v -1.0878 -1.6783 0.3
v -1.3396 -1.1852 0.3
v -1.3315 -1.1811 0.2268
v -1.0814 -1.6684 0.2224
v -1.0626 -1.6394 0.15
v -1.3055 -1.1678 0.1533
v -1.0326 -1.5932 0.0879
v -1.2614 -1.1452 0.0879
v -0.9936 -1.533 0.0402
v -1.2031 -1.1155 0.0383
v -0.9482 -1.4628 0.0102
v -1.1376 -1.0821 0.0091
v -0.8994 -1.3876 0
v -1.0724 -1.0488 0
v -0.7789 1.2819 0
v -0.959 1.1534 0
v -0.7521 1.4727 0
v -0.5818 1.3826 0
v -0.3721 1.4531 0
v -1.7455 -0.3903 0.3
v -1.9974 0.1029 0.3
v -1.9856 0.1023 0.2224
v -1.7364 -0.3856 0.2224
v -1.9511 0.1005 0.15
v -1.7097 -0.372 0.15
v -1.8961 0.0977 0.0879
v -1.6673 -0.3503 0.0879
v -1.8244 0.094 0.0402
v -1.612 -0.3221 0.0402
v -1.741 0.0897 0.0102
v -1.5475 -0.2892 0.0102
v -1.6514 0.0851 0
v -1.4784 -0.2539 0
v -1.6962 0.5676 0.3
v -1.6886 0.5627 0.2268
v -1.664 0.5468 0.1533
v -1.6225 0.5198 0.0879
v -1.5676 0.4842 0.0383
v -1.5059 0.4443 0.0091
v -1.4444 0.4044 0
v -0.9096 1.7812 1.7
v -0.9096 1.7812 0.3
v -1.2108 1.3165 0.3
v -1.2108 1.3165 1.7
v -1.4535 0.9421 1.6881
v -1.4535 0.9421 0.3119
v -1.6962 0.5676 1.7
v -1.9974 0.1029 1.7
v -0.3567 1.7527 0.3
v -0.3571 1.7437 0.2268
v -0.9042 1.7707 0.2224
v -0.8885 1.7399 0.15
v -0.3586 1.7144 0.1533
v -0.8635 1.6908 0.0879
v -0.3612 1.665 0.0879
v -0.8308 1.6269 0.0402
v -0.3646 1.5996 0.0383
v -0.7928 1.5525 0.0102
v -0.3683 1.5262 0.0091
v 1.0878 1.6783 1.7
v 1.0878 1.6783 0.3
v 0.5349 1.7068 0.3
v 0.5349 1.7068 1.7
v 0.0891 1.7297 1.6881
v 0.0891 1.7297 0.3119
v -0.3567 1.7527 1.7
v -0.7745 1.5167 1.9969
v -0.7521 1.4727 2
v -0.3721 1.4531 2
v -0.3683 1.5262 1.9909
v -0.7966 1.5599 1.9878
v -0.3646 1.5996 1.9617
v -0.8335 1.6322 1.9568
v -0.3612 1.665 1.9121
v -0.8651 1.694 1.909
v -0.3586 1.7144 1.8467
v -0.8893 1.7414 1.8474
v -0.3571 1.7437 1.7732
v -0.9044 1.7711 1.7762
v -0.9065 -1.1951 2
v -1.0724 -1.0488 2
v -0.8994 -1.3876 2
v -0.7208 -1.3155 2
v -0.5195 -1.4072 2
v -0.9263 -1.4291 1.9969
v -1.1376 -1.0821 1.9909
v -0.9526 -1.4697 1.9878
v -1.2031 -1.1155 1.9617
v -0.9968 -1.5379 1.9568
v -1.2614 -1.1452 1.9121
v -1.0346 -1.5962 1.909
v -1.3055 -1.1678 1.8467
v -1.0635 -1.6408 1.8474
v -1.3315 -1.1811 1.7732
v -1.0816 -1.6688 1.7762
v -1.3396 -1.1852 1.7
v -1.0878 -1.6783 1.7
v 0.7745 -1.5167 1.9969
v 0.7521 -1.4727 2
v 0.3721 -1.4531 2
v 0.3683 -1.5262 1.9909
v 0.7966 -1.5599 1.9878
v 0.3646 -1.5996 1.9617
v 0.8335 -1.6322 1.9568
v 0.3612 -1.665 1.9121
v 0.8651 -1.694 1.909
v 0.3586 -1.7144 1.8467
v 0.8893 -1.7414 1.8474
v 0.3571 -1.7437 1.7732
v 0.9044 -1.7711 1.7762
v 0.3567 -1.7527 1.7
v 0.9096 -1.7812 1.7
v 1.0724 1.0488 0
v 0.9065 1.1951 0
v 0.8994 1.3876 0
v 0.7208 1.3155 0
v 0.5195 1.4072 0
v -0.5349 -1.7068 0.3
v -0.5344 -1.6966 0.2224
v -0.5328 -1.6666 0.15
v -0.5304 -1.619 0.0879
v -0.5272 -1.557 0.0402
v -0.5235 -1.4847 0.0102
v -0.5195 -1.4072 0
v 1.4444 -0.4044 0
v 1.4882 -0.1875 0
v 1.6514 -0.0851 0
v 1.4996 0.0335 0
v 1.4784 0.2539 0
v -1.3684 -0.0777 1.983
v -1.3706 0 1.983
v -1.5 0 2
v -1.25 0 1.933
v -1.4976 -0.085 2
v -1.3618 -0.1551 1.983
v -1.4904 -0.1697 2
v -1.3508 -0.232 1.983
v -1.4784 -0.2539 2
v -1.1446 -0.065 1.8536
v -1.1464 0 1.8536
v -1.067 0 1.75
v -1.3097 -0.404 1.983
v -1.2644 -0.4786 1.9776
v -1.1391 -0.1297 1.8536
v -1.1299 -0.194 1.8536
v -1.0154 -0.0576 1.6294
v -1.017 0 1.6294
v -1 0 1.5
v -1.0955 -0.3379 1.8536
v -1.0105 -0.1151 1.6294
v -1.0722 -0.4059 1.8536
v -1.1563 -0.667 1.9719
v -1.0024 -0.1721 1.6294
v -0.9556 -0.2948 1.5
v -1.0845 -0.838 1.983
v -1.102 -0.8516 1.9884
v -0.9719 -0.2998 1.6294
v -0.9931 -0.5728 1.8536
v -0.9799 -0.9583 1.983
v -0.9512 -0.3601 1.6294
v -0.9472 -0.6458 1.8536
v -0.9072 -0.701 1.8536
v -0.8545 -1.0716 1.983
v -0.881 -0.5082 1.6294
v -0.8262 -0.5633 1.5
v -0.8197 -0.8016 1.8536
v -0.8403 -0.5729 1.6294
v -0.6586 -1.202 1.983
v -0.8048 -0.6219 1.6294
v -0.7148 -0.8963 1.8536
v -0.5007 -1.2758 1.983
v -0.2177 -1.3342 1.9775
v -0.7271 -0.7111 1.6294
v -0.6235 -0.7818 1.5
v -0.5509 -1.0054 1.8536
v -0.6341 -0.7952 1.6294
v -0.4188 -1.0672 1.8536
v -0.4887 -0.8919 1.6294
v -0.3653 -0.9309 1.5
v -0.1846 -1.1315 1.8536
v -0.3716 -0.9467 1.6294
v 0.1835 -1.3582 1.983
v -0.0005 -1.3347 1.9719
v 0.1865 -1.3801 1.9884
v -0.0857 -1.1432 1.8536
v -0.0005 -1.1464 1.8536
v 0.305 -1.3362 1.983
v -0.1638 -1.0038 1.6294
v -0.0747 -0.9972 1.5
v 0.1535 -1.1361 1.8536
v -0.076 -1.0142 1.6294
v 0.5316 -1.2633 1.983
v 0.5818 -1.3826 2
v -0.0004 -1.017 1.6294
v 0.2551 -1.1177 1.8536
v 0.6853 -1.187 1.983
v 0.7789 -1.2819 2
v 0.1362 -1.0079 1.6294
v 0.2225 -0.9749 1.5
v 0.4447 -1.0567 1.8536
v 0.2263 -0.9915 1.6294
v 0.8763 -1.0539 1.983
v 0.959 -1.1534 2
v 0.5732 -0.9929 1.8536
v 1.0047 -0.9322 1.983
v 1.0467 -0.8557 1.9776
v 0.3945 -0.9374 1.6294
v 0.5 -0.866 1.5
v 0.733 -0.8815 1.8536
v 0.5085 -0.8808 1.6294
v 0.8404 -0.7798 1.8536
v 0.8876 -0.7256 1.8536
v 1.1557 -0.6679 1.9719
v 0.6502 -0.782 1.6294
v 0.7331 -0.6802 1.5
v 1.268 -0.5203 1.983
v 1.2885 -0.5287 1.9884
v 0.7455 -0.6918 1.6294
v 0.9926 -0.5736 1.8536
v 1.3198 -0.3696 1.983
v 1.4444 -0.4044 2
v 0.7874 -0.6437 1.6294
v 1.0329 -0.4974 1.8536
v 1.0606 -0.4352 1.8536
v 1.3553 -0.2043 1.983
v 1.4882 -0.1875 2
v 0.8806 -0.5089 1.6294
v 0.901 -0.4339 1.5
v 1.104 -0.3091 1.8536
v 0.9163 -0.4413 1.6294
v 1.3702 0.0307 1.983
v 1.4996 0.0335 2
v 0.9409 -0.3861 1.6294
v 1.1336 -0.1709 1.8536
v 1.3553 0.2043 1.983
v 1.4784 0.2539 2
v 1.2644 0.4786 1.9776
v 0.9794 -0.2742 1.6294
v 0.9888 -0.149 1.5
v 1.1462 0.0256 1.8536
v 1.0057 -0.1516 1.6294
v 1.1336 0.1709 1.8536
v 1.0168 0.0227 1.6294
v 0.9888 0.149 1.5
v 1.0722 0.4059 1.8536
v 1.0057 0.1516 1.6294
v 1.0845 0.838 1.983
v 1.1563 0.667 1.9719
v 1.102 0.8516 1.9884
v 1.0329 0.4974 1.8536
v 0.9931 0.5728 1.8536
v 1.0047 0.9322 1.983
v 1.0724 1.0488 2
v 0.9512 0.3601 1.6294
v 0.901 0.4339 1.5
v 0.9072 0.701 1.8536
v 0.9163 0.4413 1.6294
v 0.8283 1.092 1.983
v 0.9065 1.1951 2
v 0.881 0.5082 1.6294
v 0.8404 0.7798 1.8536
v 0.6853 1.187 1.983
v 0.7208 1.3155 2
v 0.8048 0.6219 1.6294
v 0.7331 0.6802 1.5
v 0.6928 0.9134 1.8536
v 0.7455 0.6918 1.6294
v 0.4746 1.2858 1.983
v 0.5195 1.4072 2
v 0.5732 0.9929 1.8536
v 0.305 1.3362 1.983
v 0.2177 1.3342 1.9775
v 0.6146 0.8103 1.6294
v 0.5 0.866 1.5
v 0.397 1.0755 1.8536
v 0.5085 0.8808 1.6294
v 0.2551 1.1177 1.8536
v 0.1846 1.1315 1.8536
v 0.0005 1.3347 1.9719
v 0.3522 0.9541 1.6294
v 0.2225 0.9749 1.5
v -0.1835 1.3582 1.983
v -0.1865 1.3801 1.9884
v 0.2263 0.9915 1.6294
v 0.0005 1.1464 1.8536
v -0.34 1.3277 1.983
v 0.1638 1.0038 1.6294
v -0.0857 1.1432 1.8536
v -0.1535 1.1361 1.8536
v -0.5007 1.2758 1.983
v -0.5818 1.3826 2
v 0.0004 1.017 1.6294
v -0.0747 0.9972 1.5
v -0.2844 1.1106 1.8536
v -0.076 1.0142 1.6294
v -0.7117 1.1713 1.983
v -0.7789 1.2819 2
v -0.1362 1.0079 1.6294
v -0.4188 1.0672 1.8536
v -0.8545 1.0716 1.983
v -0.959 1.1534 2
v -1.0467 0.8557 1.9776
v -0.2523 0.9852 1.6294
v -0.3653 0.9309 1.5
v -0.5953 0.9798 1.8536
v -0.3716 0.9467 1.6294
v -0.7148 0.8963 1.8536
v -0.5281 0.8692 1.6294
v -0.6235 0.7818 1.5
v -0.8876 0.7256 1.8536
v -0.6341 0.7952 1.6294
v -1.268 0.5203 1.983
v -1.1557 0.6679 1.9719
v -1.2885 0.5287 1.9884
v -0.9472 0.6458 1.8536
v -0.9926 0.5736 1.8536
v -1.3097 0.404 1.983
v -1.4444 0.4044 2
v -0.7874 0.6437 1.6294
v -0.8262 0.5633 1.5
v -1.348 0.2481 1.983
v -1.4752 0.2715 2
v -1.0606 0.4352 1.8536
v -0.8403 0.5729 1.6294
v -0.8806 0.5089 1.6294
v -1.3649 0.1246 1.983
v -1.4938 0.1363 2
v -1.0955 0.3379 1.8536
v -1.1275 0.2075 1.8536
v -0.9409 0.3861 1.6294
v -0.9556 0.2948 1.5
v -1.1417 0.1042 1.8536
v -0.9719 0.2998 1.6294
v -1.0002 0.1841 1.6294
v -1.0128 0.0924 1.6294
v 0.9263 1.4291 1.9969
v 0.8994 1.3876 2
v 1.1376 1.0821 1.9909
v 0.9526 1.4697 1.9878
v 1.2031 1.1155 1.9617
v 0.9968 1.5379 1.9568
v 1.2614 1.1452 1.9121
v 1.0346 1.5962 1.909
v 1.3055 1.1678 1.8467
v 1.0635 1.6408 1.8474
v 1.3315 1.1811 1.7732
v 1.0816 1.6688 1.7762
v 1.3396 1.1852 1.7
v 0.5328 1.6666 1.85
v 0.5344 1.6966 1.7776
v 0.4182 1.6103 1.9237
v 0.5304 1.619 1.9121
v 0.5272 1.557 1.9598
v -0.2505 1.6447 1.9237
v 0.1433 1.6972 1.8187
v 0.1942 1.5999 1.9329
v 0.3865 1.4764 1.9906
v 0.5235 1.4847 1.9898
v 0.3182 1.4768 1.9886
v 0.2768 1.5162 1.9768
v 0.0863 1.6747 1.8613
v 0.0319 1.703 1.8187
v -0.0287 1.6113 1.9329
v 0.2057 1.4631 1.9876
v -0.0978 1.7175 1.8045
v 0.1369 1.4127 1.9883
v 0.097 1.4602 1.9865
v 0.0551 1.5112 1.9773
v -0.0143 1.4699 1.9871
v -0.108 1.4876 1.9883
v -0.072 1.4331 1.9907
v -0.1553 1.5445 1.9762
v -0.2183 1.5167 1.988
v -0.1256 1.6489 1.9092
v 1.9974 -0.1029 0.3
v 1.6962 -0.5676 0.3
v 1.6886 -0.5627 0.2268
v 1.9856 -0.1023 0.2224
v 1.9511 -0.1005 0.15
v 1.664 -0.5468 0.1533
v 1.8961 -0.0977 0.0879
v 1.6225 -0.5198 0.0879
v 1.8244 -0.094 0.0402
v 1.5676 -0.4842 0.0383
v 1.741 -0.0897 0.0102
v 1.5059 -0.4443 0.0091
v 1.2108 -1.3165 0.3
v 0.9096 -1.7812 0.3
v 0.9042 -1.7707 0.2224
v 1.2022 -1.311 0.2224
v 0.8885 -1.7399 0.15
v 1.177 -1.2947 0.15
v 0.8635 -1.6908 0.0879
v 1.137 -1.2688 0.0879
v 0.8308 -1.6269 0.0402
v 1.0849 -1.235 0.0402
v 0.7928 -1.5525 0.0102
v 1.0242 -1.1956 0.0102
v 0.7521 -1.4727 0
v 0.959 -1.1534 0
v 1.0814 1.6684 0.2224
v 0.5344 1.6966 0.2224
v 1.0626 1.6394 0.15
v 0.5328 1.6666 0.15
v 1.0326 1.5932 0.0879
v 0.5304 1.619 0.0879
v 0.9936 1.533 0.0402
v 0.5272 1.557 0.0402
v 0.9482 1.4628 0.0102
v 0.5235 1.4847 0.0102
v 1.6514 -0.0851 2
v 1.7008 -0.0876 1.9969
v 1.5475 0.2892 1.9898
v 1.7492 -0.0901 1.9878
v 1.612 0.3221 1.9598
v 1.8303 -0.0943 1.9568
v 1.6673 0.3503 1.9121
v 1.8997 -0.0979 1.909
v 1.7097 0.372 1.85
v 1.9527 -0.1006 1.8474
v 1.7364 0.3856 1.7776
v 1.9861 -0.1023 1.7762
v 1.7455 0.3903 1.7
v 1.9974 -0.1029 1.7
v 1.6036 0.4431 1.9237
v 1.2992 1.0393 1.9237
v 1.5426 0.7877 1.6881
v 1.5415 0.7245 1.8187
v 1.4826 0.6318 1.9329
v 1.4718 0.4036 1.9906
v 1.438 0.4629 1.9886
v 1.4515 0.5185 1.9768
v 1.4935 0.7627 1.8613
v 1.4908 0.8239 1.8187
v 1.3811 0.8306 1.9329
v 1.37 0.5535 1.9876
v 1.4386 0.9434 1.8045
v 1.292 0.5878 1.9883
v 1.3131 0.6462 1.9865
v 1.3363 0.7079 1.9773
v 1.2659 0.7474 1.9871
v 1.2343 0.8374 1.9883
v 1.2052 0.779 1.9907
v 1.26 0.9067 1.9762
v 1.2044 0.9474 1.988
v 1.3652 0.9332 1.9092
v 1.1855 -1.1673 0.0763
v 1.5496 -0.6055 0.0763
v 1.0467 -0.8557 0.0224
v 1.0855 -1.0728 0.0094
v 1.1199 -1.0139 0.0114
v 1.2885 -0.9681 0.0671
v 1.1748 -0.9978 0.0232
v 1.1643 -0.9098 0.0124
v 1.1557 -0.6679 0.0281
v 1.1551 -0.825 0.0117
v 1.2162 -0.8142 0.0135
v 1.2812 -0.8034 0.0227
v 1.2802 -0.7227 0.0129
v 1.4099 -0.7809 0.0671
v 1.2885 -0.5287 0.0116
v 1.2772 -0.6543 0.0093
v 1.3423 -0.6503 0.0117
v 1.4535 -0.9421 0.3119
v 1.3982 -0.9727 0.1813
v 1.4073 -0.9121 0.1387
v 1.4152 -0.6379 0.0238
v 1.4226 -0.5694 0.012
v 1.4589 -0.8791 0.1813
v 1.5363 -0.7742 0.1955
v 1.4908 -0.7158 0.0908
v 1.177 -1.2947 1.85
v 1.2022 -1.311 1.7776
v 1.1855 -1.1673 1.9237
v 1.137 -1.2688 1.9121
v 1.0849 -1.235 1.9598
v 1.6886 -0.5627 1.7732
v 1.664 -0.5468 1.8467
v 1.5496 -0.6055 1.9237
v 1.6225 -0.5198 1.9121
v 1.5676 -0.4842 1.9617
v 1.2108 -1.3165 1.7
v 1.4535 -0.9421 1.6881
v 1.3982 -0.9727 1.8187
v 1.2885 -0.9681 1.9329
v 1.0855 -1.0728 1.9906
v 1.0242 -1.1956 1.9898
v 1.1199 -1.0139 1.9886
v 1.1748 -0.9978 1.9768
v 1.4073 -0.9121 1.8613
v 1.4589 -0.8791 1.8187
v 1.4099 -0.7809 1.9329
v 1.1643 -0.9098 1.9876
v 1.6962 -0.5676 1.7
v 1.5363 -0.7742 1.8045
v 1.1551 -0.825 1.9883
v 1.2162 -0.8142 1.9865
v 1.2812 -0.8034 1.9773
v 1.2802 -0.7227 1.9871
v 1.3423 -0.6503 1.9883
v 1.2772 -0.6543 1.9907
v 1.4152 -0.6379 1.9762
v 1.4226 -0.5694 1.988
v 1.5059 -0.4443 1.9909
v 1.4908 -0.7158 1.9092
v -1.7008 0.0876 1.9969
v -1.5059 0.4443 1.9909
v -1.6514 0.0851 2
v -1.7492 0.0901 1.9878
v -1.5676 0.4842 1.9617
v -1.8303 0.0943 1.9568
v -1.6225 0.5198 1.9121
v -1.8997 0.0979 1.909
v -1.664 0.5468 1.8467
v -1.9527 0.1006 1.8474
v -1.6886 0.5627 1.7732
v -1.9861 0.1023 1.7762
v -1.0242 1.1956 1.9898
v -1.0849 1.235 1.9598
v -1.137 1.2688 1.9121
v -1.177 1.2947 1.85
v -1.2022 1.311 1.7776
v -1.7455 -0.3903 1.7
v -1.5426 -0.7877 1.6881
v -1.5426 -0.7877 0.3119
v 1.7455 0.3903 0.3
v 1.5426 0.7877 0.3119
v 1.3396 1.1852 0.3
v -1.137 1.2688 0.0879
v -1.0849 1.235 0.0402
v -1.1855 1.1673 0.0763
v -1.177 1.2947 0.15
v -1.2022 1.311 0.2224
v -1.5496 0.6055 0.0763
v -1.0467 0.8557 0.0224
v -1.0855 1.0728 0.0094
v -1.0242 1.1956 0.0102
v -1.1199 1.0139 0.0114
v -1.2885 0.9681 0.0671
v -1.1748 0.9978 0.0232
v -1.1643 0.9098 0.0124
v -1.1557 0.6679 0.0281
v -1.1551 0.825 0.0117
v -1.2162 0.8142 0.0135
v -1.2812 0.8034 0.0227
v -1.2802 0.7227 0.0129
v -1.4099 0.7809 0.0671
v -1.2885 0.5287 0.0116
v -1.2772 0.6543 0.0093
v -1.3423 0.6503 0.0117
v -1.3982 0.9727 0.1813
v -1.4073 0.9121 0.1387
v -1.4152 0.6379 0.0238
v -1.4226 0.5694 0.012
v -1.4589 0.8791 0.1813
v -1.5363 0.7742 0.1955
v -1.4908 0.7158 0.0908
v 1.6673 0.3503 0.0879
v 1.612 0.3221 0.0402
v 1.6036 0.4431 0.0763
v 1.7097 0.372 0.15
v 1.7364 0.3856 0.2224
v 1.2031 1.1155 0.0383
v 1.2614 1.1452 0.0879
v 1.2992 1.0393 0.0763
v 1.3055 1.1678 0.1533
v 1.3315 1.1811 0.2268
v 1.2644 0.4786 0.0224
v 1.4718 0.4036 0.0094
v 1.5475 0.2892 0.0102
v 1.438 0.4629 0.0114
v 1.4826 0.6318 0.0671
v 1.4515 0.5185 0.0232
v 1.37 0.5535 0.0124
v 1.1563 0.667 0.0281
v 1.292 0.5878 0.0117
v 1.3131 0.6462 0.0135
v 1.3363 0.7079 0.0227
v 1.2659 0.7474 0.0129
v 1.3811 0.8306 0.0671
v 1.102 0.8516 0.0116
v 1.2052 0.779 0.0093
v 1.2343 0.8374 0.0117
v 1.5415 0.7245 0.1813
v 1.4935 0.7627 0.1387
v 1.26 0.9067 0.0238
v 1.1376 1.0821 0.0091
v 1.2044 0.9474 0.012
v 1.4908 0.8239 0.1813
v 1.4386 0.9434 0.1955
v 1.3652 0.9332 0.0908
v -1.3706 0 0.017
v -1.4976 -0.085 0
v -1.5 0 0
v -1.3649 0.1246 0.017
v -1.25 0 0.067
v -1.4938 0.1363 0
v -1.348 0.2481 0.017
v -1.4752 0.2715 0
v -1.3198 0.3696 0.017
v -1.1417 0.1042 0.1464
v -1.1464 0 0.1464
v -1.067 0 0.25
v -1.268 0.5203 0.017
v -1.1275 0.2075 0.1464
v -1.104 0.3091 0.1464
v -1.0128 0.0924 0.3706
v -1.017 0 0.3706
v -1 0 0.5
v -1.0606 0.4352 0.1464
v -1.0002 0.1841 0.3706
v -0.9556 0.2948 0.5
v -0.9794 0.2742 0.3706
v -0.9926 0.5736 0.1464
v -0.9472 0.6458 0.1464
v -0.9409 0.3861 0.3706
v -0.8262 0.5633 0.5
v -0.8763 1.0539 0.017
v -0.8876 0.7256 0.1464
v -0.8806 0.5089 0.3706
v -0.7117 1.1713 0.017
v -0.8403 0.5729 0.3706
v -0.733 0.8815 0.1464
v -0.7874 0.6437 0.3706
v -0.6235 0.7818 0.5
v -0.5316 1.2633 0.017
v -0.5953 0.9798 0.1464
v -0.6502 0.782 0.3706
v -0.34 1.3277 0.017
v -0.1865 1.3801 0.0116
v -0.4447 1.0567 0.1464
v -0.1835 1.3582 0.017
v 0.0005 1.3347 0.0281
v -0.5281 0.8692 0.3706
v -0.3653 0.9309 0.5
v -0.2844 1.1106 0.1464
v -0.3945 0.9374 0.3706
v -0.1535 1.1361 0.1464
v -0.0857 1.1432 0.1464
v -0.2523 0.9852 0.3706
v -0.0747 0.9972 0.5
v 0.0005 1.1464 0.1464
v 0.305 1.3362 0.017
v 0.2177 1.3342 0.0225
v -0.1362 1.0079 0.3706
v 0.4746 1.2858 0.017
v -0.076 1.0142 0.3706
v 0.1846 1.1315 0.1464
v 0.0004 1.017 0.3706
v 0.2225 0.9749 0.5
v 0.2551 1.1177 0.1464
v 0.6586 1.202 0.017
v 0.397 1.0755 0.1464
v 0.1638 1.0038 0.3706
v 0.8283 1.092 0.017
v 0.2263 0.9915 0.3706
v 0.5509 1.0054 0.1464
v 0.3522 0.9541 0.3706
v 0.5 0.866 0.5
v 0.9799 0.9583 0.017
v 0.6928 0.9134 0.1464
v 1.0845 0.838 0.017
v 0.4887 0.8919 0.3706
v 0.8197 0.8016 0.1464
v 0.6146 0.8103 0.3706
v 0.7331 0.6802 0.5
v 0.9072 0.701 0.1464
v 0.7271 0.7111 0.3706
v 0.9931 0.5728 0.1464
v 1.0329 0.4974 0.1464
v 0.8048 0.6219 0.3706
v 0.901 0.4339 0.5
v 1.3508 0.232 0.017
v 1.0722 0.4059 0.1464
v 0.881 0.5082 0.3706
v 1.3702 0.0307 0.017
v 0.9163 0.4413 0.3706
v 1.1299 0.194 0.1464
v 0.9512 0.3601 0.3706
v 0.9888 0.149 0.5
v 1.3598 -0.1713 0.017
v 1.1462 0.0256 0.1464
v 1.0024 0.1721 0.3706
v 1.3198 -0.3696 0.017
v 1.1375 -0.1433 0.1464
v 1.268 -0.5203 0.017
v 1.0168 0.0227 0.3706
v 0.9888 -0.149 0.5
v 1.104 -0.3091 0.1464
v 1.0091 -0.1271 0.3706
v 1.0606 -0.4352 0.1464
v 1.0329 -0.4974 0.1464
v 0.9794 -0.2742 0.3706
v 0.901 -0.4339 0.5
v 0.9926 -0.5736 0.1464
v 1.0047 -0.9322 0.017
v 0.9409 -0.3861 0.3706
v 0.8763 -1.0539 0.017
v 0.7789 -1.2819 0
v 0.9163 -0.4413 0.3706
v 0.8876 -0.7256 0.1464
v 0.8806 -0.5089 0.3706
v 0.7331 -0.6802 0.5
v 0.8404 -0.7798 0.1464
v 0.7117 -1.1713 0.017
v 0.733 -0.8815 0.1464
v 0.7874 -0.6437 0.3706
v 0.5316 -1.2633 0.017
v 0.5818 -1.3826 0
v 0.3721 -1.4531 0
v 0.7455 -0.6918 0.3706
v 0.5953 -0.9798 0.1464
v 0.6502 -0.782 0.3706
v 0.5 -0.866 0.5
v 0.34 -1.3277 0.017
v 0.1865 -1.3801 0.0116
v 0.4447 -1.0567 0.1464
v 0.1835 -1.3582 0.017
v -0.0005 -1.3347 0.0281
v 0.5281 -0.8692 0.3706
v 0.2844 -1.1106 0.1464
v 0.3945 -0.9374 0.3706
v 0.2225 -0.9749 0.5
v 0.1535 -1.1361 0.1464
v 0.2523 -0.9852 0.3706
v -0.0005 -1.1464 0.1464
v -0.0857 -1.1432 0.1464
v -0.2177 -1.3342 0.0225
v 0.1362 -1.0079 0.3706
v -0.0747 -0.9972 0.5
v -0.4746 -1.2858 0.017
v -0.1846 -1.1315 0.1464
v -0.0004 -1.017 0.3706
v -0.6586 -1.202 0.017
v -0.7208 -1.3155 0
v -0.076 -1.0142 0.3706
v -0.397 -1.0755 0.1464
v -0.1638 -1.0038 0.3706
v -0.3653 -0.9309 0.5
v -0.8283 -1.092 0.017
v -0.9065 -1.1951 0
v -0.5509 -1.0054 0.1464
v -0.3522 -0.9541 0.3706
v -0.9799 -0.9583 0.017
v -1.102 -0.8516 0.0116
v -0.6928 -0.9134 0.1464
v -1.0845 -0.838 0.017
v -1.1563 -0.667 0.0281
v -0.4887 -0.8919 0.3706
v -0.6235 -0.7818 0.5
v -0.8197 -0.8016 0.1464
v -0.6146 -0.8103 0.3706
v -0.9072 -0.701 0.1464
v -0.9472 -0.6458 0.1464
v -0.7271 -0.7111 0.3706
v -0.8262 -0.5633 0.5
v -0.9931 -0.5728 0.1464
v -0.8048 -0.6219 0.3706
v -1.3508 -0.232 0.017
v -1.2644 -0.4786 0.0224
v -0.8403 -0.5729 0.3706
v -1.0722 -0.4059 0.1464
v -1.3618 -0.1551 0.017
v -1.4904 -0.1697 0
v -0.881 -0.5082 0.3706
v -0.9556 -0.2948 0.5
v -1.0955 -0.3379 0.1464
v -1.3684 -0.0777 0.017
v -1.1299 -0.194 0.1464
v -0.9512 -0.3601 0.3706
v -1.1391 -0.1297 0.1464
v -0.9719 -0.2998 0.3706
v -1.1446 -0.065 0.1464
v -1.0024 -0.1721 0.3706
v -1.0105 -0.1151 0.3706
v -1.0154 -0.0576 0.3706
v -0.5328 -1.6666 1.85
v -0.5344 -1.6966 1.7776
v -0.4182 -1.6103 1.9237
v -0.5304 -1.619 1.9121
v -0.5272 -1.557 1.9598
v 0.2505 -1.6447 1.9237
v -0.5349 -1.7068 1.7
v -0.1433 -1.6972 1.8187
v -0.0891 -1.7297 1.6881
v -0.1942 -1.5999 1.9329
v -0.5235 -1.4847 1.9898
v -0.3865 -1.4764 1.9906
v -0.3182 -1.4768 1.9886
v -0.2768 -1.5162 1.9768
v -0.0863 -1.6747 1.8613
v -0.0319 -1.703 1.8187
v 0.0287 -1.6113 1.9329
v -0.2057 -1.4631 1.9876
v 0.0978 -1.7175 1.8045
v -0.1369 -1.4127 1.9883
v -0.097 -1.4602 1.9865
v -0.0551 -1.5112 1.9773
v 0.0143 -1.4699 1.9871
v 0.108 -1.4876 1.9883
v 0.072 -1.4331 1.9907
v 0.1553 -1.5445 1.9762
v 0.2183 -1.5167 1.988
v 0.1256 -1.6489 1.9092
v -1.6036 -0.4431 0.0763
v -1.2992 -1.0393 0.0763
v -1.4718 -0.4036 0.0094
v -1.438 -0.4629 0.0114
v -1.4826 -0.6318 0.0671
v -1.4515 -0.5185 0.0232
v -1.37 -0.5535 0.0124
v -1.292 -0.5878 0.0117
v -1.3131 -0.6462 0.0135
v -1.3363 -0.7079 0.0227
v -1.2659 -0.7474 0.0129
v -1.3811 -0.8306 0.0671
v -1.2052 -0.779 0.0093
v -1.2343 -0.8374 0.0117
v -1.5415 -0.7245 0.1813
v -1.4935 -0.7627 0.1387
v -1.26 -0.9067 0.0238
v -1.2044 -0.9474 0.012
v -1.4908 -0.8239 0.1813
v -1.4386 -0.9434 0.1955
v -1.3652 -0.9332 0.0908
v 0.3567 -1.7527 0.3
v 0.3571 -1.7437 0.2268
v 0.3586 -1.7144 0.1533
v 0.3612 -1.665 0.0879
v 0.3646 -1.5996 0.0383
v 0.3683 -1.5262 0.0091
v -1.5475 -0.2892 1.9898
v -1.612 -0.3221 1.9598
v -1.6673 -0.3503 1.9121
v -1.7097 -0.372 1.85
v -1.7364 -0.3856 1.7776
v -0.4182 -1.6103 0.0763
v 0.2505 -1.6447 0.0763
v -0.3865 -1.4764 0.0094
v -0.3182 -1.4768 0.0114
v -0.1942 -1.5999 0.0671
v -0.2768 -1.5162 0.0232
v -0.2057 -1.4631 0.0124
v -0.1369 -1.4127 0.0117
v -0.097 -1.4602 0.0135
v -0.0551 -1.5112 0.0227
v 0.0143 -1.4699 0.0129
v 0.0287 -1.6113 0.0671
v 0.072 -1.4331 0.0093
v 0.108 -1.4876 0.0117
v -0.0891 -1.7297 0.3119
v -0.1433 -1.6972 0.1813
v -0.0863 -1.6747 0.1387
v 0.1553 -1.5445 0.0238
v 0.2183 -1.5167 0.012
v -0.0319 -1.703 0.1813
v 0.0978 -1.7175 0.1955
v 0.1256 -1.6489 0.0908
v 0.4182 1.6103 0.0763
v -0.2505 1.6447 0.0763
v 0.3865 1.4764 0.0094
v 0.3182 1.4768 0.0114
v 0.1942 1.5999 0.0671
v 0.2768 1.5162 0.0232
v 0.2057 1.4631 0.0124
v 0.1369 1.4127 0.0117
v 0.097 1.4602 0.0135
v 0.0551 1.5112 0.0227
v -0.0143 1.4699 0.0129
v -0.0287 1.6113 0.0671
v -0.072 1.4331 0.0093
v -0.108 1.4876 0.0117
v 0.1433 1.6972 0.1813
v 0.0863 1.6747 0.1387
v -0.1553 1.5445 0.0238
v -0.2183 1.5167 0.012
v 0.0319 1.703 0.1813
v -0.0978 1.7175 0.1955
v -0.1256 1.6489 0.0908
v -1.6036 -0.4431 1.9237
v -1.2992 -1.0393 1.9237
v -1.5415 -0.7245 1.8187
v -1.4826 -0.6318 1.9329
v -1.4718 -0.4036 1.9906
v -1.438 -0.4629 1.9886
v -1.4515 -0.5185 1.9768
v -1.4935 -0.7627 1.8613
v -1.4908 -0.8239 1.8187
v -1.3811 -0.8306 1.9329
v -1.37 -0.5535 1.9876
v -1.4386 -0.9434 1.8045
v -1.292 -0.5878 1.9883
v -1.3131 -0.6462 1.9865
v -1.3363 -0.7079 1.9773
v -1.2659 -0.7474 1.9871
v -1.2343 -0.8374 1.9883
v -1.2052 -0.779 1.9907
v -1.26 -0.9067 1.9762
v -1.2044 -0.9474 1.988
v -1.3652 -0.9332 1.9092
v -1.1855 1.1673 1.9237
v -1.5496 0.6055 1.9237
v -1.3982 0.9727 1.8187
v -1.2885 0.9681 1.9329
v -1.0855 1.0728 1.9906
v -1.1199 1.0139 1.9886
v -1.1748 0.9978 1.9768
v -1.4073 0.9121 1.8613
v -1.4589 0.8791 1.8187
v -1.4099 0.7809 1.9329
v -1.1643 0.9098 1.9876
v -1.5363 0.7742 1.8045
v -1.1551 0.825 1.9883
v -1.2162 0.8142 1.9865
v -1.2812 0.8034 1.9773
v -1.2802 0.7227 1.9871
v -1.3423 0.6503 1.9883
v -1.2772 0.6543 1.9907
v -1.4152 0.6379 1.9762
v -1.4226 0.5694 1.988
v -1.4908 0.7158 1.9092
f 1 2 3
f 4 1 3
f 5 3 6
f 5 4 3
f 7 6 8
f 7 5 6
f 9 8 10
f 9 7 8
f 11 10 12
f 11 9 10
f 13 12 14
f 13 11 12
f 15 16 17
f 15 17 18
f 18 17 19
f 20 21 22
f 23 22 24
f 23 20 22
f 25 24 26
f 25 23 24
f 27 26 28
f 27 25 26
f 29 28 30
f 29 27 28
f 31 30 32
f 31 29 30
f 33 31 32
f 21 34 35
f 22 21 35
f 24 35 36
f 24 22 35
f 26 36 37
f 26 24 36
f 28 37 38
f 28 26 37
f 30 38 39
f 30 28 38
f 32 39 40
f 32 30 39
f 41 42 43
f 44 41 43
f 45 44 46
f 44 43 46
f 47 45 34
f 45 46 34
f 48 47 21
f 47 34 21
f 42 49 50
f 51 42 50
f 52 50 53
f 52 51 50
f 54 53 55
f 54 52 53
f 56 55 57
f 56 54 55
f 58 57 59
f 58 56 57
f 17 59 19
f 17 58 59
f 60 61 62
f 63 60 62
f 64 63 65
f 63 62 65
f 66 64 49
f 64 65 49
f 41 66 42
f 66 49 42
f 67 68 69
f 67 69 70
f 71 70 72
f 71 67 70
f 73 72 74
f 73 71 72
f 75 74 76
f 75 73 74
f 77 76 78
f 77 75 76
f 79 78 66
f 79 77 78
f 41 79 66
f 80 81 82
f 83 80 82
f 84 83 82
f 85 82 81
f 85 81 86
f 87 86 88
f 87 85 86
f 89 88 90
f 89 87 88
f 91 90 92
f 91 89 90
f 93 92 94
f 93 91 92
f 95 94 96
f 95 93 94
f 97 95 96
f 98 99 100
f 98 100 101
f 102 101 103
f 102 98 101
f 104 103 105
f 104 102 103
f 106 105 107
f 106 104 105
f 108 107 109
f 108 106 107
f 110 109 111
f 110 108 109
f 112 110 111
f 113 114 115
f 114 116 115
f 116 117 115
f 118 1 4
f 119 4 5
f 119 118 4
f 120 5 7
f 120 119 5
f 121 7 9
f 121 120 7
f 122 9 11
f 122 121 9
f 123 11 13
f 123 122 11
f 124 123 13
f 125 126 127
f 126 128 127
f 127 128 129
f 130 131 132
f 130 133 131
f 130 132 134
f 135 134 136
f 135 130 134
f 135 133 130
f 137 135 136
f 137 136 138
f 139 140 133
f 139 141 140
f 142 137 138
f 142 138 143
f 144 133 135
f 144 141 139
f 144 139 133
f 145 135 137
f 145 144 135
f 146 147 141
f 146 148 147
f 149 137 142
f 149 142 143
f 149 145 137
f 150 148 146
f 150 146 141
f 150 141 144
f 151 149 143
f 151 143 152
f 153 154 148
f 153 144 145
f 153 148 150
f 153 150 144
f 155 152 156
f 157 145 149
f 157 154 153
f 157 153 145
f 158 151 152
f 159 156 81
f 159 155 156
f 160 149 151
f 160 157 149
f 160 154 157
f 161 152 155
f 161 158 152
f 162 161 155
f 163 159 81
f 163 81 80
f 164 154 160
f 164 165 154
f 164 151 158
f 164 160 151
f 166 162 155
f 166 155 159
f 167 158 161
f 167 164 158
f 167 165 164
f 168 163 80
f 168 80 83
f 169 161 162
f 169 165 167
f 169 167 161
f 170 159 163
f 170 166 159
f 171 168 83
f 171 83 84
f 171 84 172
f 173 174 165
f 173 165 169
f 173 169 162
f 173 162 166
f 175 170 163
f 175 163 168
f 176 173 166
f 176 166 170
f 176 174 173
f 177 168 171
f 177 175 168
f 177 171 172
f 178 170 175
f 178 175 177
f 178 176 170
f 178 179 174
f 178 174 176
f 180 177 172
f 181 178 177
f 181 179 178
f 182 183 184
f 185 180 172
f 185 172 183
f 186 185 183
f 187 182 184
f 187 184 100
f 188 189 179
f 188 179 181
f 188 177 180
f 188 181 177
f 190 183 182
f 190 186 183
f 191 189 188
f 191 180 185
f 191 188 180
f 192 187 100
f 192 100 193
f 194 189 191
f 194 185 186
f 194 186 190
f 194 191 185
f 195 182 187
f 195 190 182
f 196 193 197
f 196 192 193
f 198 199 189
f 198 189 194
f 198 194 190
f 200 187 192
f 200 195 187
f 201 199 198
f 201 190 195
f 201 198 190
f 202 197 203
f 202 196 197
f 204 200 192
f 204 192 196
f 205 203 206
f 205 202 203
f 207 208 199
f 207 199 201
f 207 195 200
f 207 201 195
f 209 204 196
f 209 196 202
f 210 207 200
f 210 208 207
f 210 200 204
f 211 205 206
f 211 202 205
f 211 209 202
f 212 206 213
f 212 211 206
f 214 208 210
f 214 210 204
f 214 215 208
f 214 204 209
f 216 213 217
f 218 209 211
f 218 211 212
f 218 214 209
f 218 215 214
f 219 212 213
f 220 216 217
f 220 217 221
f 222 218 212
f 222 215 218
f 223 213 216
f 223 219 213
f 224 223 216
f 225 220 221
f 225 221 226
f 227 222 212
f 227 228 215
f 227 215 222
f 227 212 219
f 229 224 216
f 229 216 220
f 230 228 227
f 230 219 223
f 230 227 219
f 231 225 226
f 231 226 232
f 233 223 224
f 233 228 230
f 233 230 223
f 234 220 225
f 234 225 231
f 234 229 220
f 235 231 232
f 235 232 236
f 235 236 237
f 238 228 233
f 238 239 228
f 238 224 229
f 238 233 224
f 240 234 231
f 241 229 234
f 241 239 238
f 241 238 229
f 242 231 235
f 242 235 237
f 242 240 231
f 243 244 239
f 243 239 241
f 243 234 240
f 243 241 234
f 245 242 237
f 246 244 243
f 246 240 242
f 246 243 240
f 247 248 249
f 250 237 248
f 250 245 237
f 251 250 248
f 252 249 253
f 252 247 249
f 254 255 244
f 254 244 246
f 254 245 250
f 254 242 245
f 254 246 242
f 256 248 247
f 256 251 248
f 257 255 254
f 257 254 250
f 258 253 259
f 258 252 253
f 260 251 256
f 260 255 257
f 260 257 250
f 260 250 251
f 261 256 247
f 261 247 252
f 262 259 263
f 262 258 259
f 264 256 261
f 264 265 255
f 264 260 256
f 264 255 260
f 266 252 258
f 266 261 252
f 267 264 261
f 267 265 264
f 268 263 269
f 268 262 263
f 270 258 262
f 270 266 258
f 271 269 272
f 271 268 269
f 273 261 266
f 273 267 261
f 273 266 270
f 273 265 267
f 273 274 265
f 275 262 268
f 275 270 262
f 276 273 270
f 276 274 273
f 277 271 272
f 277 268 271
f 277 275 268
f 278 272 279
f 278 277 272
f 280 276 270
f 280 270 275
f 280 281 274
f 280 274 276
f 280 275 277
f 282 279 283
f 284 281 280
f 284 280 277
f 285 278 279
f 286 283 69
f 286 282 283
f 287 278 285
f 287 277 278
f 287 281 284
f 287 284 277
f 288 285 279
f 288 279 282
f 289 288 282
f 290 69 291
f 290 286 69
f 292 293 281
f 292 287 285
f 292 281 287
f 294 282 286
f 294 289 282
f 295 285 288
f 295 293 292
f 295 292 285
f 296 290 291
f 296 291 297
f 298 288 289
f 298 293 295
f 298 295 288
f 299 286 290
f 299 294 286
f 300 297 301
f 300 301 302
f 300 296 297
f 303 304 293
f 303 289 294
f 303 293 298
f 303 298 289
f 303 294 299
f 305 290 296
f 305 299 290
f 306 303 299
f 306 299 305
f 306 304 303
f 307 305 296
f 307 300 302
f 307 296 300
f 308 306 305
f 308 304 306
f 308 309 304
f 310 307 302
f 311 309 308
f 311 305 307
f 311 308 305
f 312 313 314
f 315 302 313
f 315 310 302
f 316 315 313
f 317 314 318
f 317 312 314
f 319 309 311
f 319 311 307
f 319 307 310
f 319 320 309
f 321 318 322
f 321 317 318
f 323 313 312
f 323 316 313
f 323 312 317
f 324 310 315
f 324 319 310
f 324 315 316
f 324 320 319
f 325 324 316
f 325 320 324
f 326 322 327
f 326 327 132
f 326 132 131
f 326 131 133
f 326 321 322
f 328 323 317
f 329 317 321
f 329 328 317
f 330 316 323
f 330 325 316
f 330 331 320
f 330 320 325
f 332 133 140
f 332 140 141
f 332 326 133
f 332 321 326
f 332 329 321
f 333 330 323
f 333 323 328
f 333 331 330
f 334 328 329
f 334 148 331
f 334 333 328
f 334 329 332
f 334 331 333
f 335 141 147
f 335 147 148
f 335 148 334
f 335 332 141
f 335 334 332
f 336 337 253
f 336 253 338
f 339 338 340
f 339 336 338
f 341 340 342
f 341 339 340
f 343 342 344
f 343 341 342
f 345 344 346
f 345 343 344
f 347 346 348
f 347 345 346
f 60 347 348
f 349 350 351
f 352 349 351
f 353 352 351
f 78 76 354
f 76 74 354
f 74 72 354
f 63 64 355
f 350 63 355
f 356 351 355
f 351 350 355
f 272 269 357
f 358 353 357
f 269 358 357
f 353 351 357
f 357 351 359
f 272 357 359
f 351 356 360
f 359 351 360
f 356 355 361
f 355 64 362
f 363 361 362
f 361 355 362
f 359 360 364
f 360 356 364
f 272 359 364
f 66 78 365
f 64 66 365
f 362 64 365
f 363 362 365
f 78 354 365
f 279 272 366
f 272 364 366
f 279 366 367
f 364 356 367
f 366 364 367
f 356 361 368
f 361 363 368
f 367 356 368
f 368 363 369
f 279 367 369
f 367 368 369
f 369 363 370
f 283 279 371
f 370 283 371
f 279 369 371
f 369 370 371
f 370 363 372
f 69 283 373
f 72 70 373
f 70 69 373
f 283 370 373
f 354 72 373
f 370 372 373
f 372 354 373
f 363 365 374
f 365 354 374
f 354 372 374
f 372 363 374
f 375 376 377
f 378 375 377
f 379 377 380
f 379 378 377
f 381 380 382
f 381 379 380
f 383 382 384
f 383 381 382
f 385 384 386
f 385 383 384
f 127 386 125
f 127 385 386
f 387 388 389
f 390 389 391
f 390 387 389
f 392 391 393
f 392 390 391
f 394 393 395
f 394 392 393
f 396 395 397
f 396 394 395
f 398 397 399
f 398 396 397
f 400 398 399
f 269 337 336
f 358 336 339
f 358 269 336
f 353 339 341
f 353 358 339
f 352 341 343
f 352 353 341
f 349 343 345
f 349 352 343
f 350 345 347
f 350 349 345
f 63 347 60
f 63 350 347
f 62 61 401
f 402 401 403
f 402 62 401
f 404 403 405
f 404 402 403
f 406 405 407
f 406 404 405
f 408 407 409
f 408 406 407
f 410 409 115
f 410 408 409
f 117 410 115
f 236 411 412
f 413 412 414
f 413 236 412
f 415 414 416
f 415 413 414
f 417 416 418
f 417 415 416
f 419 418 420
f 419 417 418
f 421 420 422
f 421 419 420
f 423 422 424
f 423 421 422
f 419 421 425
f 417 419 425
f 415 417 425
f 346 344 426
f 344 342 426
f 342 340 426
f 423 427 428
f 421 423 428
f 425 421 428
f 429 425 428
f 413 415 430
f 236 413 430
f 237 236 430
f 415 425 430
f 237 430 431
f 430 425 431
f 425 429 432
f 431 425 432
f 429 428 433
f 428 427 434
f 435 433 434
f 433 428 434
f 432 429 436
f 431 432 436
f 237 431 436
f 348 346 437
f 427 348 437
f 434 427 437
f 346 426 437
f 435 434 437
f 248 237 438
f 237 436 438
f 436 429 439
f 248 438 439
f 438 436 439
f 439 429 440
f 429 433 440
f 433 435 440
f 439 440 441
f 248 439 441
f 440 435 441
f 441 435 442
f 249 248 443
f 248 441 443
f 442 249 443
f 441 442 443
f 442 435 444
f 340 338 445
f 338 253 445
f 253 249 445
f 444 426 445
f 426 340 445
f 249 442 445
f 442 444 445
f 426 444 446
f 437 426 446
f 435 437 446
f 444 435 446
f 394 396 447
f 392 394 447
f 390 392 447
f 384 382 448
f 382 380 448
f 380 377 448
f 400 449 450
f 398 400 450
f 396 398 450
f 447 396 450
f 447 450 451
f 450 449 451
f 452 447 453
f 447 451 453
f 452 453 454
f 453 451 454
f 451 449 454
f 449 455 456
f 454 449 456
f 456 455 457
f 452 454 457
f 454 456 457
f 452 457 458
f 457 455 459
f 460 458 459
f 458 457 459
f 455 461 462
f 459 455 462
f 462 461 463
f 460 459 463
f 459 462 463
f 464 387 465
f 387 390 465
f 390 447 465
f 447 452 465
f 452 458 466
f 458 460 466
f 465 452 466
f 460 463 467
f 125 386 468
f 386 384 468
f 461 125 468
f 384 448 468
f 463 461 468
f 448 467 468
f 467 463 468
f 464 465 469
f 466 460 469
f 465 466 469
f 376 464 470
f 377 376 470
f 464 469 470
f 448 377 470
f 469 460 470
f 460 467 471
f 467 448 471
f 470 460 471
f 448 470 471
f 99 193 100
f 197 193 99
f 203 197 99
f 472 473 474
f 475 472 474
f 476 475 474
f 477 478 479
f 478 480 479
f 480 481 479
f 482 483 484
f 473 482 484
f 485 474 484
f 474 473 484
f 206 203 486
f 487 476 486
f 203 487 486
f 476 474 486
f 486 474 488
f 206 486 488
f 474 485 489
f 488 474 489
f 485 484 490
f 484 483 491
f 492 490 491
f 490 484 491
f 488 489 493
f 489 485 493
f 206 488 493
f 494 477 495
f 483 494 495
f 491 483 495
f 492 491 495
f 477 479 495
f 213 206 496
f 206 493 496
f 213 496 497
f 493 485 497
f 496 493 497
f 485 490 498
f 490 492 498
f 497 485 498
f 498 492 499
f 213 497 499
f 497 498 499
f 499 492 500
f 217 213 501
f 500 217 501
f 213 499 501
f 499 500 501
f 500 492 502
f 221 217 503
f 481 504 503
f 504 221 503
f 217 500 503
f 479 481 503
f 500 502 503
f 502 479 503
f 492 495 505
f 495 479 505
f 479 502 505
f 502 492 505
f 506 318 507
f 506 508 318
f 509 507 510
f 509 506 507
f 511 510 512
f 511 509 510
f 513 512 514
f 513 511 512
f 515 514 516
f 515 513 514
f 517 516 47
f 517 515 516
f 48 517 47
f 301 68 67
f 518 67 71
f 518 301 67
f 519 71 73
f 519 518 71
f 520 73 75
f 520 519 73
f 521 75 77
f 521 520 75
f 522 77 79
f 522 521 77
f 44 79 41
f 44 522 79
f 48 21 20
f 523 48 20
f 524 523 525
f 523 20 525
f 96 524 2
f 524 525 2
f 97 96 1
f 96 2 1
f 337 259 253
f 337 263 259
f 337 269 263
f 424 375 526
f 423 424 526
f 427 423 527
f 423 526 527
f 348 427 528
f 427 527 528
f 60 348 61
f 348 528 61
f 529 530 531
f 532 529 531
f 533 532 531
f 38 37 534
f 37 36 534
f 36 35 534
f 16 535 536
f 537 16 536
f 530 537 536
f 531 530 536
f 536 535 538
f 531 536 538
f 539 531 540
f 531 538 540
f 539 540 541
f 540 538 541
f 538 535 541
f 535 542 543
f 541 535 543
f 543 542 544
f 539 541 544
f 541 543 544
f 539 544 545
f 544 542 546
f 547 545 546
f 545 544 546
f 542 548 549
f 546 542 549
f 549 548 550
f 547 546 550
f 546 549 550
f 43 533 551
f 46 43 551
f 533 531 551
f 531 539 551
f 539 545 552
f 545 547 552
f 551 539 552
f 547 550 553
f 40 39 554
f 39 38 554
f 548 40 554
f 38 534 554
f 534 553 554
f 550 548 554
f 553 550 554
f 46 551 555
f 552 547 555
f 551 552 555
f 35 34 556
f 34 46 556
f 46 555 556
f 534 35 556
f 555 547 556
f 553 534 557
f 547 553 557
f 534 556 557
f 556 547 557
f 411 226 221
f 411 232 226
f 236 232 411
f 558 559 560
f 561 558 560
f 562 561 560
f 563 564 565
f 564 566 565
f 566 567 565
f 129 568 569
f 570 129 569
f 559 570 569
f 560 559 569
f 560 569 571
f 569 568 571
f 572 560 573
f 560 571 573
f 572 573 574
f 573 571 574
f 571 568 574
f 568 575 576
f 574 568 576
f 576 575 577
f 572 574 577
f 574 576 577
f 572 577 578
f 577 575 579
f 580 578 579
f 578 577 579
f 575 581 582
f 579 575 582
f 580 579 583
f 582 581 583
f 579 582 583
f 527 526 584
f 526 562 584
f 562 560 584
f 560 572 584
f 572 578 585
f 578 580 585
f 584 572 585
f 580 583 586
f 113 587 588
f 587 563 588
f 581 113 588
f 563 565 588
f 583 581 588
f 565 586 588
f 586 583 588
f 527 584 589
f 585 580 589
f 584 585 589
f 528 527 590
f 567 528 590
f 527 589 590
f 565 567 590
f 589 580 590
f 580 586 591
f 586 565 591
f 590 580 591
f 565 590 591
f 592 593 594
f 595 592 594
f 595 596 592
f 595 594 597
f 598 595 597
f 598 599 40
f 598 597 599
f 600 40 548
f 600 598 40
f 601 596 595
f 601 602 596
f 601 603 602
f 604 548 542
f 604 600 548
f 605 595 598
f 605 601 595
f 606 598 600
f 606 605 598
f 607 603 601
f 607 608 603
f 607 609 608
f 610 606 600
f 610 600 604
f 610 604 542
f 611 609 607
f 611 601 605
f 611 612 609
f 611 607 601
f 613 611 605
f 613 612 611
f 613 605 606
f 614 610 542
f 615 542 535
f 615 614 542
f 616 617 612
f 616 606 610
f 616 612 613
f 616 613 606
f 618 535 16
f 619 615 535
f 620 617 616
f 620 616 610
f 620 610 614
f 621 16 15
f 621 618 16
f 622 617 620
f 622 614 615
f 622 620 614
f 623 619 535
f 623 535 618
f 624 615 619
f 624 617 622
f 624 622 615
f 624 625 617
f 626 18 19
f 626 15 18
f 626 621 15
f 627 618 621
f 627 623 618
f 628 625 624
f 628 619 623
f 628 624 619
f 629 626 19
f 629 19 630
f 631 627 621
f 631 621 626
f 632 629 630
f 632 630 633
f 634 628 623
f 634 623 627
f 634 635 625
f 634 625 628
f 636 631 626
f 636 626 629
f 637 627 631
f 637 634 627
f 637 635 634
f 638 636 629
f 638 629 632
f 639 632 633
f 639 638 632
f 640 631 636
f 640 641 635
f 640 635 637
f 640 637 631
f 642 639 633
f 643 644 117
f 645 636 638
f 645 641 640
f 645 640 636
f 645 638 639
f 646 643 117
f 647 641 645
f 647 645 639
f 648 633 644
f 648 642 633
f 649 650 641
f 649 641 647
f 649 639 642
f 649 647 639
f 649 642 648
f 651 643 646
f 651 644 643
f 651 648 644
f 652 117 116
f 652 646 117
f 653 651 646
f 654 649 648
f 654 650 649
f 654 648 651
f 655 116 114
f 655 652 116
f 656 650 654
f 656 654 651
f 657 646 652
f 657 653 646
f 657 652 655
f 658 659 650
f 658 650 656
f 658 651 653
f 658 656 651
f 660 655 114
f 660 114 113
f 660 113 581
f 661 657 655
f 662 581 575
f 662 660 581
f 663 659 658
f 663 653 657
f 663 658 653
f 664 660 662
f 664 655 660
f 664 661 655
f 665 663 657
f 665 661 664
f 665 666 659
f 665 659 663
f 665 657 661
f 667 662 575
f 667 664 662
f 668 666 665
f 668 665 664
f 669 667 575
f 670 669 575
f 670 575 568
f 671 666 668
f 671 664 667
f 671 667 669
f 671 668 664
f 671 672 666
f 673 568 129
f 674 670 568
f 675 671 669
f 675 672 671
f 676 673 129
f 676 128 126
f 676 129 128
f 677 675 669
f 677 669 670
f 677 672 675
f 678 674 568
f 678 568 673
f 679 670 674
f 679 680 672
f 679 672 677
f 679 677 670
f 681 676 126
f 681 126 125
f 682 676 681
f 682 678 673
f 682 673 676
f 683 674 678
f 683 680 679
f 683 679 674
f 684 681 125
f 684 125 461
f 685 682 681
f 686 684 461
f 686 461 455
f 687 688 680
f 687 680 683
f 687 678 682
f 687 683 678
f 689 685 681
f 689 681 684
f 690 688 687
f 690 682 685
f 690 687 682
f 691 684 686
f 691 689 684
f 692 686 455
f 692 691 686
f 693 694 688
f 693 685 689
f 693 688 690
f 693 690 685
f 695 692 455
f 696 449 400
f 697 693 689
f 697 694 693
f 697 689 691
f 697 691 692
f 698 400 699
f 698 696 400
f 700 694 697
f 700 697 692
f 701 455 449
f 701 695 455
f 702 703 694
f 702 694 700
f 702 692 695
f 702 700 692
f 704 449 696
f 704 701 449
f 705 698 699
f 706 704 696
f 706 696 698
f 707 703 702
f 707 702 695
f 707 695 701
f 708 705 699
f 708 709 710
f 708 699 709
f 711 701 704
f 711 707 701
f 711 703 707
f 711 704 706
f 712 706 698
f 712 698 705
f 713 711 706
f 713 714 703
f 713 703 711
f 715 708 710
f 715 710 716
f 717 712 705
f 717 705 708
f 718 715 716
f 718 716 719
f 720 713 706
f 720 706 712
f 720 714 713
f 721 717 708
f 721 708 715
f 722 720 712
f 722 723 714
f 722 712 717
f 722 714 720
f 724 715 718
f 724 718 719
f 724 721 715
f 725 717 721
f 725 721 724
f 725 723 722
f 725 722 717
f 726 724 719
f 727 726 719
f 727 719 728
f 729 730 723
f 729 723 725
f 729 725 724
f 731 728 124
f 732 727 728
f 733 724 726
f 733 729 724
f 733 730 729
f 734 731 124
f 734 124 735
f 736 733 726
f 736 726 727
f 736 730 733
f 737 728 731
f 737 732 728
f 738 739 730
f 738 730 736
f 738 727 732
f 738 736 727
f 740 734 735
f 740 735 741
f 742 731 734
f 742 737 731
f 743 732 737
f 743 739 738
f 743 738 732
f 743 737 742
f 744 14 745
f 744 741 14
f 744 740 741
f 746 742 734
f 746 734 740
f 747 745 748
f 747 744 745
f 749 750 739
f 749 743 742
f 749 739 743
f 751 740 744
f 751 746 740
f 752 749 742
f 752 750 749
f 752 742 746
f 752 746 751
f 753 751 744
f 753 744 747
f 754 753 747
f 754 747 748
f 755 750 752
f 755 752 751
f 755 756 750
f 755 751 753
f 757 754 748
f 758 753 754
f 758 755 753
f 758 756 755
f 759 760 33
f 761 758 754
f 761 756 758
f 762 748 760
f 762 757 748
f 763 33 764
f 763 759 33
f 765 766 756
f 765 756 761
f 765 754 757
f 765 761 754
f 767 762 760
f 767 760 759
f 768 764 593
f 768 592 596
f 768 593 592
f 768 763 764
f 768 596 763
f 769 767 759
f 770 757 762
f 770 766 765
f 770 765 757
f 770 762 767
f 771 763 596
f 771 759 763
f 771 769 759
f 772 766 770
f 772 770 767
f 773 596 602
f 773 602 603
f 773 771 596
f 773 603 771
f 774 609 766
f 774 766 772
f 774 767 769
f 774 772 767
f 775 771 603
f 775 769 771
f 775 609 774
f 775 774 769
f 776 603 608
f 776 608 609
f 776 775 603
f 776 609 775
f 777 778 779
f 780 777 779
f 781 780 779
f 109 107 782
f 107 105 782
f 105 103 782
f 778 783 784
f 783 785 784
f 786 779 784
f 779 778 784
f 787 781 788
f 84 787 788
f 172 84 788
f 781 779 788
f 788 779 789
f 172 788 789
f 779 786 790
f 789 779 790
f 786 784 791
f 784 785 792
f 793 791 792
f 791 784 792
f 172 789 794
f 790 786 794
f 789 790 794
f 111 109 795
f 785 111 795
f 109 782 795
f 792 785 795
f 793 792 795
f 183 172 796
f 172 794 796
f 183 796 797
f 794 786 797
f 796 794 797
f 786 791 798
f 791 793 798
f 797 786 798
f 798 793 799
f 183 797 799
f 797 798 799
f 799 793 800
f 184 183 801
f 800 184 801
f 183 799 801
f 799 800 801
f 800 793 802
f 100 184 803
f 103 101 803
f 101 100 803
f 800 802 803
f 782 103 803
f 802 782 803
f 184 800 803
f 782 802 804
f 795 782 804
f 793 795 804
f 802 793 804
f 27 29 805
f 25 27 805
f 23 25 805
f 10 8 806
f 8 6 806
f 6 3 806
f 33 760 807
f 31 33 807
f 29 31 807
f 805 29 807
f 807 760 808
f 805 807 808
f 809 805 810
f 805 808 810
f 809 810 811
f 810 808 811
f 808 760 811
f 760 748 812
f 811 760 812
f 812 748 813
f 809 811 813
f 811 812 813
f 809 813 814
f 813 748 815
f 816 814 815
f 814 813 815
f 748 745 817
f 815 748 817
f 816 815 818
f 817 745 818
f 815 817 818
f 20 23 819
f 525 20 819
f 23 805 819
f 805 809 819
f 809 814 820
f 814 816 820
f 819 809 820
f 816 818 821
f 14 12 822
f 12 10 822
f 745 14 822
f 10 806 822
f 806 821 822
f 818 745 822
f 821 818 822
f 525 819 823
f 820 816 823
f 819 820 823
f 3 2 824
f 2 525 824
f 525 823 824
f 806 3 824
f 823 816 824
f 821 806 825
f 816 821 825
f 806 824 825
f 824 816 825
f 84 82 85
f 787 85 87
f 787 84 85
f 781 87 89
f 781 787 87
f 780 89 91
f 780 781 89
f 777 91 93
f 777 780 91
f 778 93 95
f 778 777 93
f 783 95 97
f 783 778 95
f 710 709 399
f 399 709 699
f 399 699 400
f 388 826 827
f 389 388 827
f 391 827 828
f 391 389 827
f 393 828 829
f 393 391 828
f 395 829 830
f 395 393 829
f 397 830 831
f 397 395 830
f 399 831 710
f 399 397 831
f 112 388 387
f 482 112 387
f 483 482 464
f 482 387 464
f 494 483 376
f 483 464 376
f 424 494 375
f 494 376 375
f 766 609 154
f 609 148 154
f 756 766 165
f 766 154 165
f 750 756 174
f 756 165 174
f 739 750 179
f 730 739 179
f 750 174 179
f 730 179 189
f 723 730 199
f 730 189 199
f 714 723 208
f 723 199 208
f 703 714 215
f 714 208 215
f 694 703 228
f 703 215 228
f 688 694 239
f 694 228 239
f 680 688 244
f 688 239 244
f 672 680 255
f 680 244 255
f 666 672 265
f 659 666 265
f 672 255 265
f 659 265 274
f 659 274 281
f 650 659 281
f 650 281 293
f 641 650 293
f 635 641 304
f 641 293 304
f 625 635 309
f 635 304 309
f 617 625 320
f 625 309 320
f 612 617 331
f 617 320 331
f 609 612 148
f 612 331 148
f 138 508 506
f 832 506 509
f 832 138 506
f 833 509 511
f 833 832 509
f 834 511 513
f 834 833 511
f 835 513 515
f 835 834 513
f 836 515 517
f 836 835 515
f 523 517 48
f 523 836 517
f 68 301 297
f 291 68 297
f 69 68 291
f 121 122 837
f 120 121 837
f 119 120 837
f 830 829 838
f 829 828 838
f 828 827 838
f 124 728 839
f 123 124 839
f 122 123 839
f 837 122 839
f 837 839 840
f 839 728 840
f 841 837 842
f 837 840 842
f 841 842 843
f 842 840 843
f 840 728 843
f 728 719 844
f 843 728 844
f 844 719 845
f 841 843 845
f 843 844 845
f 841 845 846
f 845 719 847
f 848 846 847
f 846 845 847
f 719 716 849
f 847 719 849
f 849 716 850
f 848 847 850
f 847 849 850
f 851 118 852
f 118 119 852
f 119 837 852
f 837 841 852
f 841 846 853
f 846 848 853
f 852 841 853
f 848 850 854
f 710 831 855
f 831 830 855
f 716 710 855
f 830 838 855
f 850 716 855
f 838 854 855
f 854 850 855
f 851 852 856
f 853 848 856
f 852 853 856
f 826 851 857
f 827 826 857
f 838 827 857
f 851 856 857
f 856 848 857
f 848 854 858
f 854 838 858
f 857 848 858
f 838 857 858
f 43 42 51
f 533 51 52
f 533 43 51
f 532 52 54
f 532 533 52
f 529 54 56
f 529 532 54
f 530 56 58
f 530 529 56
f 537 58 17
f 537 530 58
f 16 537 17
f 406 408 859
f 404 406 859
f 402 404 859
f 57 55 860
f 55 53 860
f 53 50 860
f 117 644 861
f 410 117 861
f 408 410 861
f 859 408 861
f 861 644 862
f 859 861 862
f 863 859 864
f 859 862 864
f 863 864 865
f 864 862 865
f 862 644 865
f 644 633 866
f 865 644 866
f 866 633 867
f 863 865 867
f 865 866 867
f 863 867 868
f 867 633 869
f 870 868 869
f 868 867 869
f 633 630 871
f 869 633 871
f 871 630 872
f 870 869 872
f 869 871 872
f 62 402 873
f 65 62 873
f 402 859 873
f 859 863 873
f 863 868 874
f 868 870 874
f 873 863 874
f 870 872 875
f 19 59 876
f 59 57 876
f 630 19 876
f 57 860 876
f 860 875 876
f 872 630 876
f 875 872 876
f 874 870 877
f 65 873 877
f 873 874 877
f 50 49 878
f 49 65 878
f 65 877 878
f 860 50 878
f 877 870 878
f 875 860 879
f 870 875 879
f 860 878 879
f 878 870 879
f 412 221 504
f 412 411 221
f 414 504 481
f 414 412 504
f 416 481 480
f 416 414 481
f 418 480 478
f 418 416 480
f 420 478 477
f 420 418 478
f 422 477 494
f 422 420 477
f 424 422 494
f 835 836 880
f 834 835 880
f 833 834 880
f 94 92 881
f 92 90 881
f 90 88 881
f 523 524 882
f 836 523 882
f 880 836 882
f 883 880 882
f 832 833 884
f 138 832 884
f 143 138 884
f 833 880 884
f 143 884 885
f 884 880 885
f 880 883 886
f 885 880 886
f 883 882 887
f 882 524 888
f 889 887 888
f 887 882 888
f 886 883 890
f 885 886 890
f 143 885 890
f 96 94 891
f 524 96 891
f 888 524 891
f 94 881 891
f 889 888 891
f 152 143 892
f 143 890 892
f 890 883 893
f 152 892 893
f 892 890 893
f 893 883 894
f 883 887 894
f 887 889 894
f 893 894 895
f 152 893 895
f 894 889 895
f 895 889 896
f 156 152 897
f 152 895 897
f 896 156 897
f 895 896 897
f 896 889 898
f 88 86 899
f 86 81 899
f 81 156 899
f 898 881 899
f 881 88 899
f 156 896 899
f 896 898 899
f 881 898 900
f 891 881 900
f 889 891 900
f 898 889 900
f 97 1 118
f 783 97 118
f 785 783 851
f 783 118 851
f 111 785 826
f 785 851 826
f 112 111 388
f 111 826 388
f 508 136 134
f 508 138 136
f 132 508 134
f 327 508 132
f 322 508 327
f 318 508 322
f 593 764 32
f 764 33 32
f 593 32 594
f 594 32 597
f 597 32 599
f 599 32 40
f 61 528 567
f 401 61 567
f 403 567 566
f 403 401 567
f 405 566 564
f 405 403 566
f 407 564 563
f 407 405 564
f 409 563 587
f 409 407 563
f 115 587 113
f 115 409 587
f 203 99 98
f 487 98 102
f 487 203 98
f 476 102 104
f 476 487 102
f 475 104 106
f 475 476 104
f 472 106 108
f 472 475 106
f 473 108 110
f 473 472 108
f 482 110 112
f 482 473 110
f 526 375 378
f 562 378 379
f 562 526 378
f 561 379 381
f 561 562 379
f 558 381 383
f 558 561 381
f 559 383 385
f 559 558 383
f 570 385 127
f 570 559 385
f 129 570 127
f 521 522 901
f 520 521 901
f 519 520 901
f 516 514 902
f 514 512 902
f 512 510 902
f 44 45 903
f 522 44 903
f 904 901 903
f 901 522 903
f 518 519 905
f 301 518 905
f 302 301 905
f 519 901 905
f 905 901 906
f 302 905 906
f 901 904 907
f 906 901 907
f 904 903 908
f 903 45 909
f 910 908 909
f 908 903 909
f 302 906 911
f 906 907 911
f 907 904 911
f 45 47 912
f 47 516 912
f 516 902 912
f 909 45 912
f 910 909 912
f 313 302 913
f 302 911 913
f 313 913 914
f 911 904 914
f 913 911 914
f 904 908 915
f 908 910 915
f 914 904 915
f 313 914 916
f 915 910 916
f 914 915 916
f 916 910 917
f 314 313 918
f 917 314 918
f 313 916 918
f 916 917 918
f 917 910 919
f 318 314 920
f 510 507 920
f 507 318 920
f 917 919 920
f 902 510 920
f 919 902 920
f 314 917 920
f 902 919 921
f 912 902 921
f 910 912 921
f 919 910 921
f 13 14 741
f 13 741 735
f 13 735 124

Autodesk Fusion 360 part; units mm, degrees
sketch "Sketch8" plane through (0, 0, 0) normal (0, 0, 1) x (1, 0, 0)
  line L0 (0.9096, -1.7812) -> (1.9974, -0.1029)
  line L1 (1.9974, -0.1029) -> (1.0878, 1.6783)
  line L2 (1.0878, 1.6783) -> (-0.9096, 1.7812)
  line L3 (-0.9096, 1.7812) -> (-1.9974, 0.1029)
  line L4 (-1.9974, 0.1029) -> (-1.0878, -1.6783)
  line L5 (-1.0878, -1.6783) -> (0.9096, -1.7812)
  dimension "d12" = 2
extrude "Extrude4" add sketch "Sketch8" along normal blind 2
sketch "Sketch9" plane through (0, 0, 2) normal (0, 0, 1) x (-1, 0, 0)
  line L0 (1.0878, 1.6783) -> (-0.9096, 1.7812)
  line L1 (-0.9096, 1.7812) -> (-1.9974, 0.1029)
  line L2 (-1.9974, 0.1029) -> (-1.0878, -1.6783)
  line L3 (-1.0878, -1.6783) -> (0.9096, -1.7812)
  line L4 (0.9096, -1.7812) -> (1.9974, -0.1029)
  line L5 (1.9974, -0.1029) -> (1.0878, 1.6783)
  circle A0 centre (0, 0) radius 1
  dimension "d15" = 2
extrude "Extrude5" cut sketch "Sketch9" against normal blind 3 contours A0
fillet "Fillet1" radius 0.5 2 edges at (0.9323, 0.3616, 0) (0.9323, -0.3616, 2)
fillet "Fillet2" radius 0.3 12 edges at (-0.0891, -1.7298, 0) (1.4535, -0.9421, 0) (1.5426, 0.7877, 0) (-0.0891, -1.7298, 2) (1.4535, -0.9421, 2) (1.5426, 0.7877, 2) (-1.4535, 0.9421, 2) (-1.5426, -0.7877, 2) (0.0891, 1.7298, 2) (-1.5426, -0.7877, 0) (-1.4535, 0.9421, 0) (0.0891, 1.7298, 0)
thread "Thread1" thread offset 0 thread length 10
